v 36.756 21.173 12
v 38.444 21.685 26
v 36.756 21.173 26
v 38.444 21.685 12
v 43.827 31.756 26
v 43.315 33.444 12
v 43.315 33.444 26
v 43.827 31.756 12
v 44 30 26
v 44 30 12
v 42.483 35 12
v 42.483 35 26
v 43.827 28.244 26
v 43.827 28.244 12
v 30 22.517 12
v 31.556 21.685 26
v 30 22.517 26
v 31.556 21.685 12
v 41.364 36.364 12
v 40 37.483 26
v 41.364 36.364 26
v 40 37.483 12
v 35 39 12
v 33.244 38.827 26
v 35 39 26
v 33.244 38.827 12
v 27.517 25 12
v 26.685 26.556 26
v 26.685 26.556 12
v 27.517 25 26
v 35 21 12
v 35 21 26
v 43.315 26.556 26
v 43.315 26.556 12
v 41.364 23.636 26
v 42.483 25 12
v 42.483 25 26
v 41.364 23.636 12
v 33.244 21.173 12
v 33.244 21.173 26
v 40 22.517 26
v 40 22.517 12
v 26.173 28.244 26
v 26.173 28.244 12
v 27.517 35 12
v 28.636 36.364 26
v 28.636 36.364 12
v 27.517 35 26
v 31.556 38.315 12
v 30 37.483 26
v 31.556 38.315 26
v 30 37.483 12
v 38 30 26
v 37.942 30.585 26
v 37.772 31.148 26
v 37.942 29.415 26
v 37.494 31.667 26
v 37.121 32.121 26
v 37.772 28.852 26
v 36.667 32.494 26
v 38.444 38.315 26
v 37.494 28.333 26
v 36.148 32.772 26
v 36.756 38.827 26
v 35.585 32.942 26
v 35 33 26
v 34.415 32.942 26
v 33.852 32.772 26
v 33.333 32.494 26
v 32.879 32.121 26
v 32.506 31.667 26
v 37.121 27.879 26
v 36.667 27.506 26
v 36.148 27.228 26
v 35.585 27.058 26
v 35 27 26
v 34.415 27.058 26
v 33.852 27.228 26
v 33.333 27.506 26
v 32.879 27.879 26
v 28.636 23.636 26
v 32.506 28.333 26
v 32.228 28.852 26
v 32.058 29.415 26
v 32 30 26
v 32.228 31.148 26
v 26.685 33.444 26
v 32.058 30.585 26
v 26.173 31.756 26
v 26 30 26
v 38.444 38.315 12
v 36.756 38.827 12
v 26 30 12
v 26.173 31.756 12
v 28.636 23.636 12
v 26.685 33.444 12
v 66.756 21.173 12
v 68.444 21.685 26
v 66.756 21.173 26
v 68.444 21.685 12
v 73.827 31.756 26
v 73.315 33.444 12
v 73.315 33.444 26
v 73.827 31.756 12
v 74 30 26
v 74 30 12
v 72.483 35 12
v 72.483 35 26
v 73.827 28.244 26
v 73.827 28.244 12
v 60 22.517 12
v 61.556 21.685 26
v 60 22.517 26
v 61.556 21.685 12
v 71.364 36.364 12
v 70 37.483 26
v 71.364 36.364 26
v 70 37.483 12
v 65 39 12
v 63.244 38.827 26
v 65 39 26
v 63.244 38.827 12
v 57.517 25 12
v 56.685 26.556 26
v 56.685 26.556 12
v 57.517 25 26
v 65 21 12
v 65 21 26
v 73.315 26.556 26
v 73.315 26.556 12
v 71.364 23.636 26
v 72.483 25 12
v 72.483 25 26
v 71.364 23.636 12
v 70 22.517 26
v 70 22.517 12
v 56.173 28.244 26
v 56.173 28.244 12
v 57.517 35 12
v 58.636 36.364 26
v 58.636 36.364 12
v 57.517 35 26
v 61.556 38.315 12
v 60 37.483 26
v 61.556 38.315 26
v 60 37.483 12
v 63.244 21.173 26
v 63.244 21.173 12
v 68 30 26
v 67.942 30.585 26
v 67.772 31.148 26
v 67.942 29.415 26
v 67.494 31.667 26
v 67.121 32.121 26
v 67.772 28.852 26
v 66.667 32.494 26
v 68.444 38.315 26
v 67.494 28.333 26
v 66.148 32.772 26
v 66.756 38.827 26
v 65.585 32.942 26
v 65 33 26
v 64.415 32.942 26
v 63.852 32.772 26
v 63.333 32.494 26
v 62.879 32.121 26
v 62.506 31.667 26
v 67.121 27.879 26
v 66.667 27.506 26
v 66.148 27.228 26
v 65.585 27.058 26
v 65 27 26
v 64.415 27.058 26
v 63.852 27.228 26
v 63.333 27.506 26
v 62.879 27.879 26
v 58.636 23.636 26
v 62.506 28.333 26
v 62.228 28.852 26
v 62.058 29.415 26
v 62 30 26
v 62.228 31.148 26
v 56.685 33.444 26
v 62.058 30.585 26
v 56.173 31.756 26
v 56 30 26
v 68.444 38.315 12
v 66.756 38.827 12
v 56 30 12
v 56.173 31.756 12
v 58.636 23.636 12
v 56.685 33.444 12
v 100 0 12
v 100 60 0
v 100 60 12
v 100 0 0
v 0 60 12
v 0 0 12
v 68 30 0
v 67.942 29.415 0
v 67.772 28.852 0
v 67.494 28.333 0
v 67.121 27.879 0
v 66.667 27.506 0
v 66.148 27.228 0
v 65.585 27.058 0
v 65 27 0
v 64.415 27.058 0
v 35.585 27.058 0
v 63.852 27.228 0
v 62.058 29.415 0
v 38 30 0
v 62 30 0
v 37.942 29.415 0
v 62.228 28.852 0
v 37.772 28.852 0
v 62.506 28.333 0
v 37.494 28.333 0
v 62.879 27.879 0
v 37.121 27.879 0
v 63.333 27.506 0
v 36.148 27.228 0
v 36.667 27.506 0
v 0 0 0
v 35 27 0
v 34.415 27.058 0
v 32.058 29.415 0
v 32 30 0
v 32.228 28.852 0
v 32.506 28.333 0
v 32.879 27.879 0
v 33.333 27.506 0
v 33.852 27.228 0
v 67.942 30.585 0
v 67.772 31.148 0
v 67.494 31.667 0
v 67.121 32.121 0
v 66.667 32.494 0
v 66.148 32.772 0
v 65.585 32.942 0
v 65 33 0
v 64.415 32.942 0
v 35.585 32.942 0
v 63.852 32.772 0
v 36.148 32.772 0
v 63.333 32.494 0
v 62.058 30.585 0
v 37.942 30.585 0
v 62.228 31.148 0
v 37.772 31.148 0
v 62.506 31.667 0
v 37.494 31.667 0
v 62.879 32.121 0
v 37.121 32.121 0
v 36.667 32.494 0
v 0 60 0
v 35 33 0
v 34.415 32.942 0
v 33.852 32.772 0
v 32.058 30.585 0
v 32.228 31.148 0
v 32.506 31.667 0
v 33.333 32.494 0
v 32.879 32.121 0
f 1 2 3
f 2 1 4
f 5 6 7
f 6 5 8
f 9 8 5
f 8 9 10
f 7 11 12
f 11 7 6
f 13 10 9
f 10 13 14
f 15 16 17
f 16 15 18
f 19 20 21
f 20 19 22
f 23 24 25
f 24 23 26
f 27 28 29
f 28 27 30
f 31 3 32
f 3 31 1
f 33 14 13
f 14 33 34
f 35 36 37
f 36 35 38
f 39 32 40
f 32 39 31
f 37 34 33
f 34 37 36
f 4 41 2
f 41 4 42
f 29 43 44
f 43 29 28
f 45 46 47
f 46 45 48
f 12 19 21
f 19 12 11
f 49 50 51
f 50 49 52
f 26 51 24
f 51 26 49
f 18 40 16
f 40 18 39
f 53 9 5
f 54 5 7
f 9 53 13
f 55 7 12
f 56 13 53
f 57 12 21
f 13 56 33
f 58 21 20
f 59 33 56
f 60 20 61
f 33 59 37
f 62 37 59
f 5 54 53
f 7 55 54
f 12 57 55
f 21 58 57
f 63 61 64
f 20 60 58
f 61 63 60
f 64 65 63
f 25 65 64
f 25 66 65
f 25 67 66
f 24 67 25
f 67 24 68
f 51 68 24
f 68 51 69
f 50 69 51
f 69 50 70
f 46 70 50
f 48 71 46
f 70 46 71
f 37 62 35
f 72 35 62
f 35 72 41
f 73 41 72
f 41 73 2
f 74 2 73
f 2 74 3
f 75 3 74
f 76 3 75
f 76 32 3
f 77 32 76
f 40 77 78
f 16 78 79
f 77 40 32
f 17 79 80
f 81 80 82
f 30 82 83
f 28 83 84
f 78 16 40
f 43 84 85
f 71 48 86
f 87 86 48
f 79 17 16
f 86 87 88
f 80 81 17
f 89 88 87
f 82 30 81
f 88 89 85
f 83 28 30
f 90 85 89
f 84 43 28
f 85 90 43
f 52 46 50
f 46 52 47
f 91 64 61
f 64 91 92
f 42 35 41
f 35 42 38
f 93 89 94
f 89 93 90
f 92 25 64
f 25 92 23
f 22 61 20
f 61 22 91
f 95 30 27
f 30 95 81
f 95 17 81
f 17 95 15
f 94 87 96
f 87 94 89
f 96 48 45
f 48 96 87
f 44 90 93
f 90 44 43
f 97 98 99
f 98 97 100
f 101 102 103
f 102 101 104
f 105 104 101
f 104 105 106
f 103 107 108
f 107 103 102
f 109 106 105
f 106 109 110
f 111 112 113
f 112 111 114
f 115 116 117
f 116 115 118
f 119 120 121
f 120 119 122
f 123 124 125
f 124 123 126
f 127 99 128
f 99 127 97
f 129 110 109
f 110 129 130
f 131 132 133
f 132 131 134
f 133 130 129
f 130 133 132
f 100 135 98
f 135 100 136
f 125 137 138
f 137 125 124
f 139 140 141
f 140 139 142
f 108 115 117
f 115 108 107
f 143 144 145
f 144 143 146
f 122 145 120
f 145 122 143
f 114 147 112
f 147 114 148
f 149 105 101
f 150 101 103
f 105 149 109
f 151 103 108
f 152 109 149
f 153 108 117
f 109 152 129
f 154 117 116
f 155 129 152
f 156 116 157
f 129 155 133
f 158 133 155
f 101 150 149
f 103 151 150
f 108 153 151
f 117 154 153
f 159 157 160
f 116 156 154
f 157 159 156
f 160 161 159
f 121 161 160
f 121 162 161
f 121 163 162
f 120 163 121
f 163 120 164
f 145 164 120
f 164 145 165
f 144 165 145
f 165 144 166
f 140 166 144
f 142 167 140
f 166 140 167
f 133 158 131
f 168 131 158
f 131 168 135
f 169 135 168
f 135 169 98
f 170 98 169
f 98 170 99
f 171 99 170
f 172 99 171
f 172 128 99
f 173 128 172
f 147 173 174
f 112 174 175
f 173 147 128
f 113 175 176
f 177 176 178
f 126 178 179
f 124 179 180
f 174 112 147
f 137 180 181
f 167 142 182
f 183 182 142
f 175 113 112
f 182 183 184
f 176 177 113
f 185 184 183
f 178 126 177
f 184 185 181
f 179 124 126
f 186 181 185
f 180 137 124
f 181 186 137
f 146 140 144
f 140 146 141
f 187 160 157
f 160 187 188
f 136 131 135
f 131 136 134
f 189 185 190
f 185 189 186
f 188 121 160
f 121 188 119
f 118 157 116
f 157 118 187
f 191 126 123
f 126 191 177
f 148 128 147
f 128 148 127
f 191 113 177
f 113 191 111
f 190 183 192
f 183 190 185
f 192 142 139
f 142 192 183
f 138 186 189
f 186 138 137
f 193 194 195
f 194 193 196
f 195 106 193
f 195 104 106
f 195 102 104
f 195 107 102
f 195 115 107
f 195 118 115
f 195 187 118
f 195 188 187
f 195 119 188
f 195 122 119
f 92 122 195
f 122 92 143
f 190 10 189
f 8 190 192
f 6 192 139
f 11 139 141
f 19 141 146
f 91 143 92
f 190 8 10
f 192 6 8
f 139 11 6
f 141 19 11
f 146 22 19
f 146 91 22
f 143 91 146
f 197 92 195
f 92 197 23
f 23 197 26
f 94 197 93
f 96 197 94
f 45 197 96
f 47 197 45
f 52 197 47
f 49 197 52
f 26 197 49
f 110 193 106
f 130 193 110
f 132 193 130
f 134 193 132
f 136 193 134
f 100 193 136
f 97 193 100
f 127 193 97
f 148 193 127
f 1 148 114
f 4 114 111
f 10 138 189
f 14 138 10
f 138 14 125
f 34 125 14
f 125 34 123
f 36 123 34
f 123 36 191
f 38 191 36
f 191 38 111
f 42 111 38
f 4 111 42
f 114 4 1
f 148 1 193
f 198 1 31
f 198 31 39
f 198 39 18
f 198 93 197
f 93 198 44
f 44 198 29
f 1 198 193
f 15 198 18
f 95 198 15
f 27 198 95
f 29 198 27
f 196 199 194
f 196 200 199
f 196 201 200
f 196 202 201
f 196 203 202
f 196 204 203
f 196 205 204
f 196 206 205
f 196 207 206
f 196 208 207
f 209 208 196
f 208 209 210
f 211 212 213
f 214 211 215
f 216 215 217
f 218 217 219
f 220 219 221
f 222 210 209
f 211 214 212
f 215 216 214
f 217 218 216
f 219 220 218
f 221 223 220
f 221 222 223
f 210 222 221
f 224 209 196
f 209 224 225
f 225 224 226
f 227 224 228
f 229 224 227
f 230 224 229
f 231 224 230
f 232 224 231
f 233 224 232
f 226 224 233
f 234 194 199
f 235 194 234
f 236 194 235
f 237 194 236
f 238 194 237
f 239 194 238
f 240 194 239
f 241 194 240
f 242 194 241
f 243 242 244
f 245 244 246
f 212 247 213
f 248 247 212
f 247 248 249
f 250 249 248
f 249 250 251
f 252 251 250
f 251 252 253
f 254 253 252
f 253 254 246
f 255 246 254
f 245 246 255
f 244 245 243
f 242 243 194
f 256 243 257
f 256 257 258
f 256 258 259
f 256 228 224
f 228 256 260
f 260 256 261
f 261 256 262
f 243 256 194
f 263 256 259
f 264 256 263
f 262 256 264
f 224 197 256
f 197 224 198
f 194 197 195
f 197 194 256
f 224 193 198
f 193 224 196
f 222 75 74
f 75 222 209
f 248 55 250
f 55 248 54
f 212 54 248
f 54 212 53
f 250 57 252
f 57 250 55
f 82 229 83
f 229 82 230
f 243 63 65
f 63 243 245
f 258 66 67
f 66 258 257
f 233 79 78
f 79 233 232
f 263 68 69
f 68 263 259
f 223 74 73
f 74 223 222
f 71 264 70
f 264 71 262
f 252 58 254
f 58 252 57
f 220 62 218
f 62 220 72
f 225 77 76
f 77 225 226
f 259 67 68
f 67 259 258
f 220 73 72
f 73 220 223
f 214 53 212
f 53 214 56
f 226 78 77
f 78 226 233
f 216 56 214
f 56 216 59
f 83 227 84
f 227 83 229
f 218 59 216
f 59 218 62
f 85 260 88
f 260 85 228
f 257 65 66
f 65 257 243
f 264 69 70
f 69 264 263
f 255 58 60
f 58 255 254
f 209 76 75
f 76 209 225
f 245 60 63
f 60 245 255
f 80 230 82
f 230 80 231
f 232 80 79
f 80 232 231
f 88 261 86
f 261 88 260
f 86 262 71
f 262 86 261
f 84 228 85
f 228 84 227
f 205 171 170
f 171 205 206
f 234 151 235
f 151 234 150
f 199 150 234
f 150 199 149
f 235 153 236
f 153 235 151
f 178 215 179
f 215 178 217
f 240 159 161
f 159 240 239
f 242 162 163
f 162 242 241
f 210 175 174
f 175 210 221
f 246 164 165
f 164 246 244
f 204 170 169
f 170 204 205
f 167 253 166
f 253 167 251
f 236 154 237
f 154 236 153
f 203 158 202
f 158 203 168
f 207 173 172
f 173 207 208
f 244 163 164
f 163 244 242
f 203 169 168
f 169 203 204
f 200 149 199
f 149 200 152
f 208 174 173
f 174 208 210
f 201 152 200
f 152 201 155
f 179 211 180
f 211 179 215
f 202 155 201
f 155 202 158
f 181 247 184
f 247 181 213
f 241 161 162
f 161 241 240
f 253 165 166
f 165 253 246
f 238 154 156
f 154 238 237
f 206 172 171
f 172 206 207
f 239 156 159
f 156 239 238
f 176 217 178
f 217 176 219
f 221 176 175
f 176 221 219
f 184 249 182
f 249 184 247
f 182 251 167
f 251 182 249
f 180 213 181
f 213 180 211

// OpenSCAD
$fn = 32;

// ----------------------------------------------------------------------
// Drill jig: two_boss jig
// ----------------------------------------------------------------------

// --- parameters (mm) ---
plate_l = 100;            // plate length, X
plate_w = 60;             // plate width, Y
plate_t = 12;             // plate thickness
boss_d = 18;              // guide boss diameter
boss_h = 15;              // boss height above the plate
guide_d = 6;              // guide hole diameter
boss_pitch = 30;          // boss pitch

n_boss = 2;  // guide bosses
boss_x0 = (plate_l - (n_boss - 1) * boss_pitch) / 2;  // first boss X
boss_top = plate_t - 1 + boss_h;  // boss crown height
total_h = boss_top;  // overall height

difference() {
  union() {
  cube([plate_l, plate_w, plate_t]);
  for (i = [0 : n_boss - 1])
    translate([boss_x0 + i * boss_pitch, plate_w / 2, plate_t - 1])
      cylinder(h = boss_h, d = boss_d);
  }
  for (i = [0 : n_boss - 1])
    translate([boss_x0 + i * boss_pitch, plate_w / 2, -1])
      cylinder(h = plate_t + boss_h, d = guide_d);
}
